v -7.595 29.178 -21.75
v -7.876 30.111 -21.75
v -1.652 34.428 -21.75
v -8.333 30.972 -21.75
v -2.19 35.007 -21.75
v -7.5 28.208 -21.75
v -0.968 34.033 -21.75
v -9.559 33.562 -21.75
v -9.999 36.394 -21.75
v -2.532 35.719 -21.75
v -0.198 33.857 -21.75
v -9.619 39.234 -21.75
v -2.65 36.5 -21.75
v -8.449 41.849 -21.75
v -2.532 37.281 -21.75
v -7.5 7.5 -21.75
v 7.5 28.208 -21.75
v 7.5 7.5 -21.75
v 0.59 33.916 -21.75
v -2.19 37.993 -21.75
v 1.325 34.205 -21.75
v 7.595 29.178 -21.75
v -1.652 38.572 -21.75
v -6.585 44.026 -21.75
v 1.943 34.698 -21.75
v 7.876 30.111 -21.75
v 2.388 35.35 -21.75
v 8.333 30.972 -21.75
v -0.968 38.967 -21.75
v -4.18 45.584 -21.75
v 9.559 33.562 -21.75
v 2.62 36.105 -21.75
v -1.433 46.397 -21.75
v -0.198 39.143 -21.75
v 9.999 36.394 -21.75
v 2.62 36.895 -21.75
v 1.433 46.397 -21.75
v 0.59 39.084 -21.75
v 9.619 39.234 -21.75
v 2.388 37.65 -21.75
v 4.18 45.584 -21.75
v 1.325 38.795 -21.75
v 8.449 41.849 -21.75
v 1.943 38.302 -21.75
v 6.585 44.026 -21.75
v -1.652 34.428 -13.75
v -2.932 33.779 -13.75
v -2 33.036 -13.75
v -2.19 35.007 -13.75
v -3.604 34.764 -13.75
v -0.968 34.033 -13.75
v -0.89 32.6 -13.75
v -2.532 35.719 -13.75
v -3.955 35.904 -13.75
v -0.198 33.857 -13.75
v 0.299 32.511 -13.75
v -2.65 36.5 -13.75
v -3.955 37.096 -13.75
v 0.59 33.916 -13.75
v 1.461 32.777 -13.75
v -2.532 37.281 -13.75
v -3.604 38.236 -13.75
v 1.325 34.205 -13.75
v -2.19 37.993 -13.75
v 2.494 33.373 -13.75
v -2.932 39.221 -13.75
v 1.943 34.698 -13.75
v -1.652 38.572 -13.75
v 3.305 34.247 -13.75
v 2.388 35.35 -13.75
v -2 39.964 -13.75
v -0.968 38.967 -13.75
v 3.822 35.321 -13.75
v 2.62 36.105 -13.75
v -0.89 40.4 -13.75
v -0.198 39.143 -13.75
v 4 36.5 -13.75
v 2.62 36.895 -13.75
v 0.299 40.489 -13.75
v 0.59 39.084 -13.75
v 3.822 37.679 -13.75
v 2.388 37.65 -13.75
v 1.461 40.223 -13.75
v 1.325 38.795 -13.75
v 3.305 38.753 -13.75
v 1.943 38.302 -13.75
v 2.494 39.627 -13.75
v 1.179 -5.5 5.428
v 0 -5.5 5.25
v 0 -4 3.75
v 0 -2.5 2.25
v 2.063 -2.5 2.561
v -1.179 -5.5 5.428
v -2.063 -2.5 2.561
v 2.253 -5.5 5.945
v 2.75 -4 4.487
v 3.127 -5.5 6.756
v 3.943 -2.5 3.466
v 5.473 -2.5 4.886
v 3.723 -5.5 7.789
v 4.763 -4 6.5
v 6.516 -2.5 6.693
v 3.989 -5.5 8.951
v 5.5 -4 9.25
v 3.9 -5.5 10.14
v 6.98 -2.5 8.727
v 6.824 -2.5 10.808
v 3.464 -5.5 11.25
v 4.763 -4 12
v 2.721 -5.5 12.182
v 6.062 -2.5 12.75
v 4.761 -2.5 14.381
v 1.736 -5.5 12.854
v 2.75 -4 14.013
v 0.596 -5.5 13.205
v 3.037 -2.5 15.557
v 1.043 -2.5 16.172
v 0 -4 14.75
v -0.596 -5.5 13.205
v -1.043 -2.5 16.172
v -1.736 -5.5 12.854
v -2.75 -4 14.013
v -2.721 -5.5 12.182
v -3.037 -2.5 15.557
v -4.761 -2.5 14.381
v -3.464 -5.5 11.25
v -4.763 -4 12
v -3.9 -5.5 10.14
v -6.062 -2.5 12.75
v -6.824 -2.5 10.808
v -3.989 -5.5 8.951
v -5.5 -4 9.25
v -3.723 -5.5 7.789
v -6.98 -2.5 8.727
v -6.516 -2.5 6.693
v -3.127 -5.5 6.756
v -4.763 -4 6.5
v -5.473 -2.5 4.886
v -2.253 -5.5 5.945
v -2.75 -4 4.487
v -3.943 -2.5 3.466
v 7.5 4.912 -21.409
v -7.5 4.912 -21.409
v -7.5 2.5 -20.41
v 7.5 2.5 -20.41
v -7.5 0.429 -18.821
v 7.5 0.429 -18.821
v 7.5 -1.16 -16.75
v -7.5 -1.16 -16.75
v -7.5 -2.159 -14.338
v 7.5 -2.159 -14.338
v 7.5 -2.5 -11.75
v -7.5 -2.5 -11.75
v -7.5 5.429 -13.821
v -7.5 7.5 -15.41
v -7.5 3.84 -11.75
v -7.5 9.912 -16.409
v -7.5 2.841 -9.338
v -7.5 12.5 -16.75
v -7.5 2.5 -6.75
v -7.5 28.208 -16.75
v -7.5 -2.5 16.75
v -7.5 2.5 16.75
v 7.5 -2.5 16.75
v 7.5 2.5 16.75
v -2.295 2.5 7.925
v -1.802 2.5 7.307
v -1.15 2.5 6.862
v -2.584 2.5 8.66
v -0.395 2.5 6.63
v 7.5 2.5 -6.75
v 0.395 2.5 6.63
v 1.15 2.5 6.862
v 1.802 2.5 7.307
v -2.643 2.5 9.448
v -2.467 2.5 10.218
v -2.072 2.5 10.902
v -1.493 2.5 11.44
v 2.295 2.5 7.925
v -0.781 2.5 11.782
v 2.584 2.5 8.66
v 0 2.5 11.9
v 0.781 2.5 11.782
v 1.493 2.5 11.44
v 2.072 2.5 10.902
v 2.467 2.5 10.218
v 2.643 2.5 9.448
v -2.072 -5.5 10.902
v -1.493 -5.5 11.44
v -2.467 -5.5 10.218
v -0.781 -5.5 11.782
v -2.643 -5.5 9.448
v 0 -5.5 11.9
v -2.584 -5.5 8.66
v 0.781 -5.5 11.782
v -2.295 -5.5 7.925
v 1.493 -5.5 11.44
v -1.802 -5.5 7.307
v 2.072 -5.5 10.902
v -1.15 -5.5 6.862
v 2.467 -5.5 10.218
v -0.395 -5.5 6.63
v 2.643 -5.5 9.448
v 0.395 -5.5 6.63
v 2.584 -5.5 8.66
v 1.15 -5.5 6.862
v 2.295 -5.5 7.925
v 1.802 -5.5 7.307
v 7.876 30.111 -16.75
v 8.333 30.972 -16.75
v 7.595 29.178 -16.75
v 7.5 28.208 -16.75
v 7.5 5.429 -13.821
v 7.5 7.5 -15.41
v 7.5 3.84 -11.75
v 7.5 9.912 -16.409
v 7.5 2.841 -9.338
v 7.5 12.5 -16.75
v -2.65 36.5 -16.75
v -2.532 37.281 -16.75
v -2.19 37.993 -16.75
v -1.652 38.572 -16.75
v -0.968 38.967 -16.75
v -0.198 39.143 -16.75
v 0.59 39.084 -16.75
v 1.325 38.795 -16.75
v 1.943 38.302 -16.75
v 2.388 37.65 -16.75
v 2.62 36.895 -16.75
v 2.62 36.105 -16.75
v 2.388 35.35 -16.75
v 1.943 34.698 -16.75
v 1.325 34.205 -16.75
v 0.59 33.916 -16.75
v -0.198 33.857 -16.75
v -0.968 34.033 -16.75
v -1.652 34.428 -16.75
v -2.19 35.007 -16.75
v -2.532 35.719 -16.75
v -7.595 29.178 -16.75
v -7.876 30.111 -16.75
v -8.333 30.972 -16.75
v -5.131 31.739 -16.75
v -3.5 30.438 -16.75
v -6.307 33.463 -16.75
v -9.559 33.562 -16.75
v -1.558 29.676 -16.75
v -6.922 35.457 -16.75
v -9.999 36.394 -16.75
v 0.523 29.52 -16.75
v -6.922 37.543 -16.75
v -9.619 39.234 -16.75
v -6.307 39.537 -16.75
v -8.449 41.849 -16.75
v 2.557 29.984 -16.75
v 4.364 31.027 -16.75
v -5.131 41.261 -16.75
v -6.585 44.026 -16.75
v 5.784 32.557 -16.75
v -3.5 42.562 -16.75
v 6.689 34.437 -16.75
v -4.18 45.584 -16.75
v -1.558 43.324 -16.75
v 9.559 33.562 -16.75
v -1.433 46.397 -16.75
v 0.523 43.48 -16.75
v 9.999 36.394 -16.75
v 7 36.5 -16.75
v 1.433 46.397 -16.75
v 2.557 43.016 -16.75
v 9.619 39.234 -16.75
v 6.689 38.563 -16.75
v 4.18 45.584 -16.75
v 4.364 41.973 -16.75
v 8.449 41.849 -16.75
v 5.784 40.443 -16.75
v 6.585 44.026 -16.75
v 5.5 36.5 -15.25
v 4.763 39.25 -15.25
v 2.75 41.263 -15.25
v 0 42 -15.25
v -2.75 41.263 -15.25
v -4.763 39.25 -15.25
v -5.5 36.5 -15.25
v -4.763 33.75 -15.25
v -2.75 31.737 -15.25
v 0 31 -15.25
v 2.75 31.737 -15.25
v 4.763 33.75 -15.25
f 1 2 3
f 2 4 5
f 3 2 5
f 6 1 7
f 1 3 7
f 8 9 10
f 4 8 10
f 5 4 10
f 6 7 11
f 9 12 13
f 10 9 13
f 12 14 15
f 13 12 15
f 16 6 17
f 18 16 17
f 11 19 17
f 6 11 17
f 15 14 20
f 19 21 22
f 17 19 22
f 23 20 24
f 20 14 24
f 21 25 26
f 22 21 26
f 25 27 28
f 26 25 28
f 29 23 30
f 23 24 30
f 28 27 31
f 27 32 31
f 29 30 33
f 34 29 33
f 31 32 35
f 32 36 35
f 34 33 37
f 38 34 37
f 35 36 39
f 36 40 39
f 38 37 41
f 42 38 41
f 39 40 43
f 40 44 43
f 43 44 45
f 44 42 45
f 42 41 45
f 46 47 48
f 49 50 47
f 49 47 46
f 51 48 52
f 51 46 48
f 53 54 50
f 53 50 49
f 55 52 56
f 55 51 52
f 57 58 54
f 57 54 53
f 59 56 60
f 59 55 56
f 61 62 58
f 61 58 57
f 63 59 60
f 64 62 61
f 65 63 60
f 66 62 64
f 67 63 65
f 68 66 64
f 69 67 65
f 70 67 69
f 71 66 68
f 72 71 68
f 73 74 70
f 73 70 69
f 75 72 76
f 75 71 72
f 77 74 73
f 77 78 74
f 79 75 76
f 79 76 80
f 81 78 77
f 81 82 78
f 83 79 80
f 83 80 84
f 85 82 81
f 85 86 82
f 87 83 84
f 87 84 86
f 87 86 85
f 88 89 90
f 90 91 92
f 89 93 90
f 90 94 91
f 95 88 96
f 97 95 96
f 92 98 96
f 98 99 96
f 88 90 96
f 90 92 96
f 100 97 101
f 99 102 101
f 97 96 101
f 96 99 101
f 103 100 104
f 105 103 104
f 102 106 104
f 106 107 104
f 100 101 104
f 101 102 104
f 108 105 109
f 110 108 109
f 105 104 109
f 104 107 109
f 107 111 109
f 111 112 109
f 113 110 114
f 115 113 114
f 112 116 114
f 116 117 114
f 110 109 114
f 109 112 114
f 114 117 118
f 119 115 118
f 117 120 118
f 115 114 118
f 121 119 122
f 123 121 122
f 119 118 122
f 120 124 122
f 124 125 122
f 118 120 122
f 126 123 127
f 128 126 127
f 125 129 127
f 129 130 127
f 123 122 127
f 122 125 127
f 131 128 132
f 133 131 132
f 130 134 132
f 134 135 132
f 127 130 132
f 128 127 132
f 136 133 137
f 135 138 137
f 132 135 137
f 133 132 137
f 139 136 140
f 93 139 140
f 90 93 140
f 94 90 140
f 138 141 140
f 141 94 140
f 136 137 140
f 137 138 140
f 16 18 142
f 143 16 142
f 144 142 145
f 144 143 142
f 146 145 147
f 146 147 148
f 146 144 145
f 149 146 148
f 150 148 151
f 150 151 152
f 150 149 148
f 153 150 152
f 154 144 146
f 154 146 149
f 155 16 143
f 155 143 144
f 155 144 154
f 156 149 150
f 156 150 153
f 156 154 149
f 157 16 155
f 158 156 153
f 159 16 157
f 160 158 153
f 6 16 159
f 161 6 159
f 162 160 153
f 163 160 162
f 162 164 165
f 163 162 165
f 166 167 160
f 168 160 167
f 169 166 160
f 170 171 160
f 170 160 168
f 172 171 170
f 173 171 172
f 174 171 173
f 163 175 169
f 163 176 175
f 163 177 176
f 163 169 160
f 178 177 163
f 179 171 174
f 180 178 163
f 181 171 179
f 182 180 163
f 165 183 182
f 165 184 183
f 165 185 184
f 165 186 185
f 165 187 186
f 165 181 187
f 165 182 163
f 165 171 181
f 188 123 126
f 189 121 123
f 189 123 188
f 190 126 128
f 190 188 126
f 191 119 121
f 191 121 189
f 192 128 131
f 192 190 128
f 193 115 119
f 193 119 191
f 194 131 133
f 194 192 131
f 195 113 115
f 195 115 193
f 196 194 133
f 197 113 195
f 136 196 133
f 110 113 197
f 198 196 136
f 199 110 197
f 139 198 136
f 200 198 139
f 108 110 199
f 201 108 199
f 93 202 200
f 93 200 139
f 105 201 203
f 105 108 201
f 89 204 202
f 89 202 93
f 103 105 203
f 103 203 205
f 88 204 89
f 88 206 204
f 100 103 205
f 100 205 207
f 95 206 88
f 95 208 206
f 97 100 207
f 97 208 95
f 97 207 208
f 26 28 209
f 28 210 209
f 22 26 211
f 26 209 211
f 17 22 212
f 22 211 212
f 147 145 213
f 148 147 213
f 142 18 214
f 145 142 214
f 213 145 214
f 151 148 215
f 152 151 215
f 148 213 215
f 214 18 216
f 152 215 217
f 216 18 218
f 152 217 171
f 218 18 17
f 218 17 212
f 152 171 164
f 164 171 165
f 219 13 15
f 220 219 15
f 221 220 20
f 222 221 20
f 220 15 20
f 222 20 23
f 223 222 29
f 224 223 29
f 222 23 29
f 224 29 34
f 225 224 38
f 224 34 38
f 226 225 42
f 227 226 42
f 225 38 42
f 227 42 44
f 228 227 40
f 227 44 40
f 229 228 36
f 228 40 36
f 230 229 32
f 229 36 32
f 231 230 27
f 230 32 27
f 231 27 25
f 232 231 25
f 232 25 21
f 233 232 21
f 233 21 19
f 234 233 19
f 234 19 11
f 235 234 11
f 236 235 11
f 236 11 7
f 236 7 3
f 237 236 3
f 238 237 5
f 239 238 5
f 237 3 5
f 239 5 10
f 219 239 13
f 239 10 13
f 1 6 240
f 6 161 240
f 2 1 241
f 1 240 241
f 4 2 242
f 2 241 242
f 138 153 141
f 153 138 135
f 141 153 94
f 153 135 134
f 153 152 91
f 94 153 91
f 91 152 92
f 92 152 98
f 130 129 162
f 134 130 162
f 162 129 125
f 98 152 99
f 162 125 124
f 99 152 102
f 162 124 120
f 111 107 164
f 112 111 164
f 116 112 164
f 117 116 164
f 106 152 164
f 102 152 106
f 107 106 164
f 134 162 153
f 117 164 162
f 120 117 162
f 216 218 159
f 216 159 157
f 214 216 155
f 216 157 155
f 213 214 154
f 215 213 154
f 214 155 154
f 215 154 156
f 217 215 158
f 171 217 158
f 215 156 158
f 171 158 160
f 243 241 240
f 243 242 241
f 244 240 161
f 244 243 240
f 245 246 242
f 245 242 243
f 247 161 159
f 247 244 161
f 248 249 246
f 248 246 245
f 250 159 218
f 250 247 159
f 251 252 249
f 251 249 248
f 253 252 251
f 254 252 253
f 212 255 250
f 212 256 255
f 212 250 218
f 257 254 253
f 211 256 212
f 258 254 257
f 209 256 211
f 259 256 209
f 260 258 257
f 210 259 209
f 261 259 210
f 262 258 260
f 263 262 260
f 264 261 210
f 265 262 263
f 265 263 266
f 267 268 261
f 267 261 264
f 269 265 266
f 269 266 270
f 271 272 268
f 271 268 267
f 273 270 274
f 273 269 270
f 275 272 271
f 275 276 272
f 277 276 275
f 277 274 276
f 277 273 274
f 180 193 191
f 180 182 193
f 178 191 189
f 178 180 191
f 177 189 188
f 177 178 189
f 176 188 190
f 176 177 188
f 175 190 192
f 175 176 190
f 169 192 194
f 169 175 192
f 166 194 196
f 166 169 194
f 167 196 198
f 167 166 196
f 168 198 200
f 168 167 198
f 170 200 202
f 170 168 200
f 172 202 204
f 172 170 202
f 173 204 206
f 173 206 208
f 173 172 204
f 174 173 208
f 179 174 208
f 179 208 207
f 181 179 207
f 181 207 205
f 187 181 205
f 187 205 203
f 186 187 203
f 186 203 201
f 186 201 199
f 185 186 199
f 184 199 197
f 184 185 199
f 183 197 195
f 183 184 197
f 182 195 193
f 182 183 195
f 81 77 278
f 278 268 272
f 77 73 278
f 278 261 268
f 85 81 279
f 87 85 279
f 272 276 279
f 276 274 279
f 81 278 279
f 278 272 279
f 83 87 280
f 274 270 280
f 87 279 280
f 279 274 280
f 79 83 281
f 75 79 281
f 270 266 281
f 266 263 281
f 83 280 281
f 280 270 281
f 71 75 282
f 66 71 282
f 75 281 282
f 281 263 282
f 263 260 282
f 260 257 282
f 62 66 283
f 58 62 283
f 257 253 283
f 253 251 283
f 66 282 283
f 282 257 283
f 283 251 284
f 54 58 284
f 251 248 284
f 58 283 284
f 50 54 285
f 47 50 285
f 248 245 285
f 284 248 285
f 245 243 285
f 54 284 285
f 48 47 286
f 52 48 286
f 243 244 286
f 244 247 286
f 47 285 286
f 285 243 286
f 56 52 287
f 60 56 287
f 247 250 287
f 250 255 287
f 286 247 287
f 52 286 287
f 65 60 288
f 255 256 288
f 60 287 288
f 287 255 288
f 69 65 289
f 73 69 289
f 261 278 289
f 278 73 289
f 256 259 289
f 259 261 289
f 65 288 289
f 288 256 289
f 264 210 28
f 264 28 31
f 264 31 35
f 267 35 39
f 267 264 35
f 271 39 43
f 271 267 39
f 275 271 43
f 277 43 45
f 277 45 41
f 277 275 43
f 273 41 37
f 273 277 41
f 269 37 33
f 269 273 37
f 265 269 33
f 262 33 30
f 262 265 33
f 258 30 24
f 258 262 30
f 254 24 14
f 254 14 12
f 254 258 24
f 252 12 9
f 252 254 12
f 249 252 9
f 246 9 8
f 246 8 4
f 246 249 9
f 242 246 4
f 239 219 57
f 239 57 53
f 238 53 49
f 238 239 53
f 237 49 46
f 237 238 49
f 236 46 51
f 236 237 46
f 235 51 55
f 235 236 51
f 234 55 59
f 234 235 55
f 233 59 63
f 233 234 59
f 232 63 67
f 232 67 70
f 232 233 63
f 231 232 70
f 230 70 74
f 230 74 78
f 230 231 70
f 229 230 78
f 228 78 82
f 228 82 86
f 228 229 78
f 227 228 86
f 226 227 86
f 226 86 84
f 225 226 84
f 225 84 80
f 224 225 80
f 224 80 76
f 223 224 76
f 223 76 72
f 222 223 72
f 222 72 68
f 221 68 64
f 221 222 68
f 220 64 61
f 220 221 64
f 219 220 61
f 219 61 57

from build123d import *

# Parameters (mm, degrees)
BOSS_EXTRUDE5_DEPTH      = 7.5
BOSS_EXTRUDE5_DEPTH_BACK = 7.5
SKETCH8_W                = 33.5
SKETCH8_H                = 5
SKETCH9_R                = 10
BOSS_EXTRUDE6_DEPTH      = 5
SKETCH11_R               = 2.65
CUT_EXTRUDE7_DEPTH       = 5
SKETCH12_R               = 4
SKETCH12_R_2             = 2.65
BOSS_EXTRUDE7_DEPTH      = 3
CHAMFER1_SIZE            = 3
FILLET1_R                = 10
FILLET2_R                = 5
SKETCH13_R               = 2.65
CUT_EXTRUDE8_DEPTH       = 50
SKETCH14_R               = 4
SKETCH14_R_2             = 2.65
BOSS_EXTRUDE8_DEPTH      = 3
CHAMFER2_SIZE            = 3


with BuildPart() as part:
    # Sketch8 → Boss-Extrude5 (new, two sides: drawn at the far end of the back side and taken through both)
    with BuildSketch(Plane.ZY.offset(-BOSS_EXTRUDE5_DEPTH_BACK)):
        Rectangle(SKETCH8_W, SKETCH8_H)
        Polygon((-16.75, -2.5), (-16.75, 2.5), (-16.75, 41.5), (-21.75, 41.5), (-21.75, -2.5), align=None)
    extrude(amount=BOSS_EXTRUDE5_DEPTH + BOSS_EXTRUDE5_DEPTH_BACK)

    # Sketch9 → Boss-Extrude6 (add)
    with BuildSketch(Plane.XY.offset(-16.75)):
        with Locations((0, 36.5)):
            Circle(SKETCH9_R)
    extrude(amount=-BOSS_EXTRUDE6_DEPTH)

    # Sketch11 → Cut-Extrude7 (cut)
    with BuildSketch(Plane(origin=(0, 0, -21.75), x_dir=(-1, 0, 0), z_dir=(0, 0, -1))):
        with Locations((0, 36.5)):
            Circle(SKETCH11_R)
    extrude(amount=-CUT_EXTRUDE7_DEPTH, mode=Mode.SUBTRACT)

    # Sketch12 → Boss-Extrude7 (add)
    with BuildSketch(Plane.XY.offset(-16.75)):
        with Locations((0, 36.5)):
            Circle(SKETCH12_R)
        with Locations(Location((0, 36.5, 0), (0, 0, 180))):
            Circle(SKETCH12_R_2, mode=Mode.SUBTRACT)
    extrude(amount=BOSS_EXTRUDE7_DEPTH)

    # Chamfer1
    chamfer1_edges = [part.edges().sort_by_distance(p)[0] for p in [
        (-4, 36.5, -16.75),
    ]]
    chamfer(chamfer1_edges, length=CHAMFER1_SIZE - 0.0001)  # a hair under: the kernel refuses the full size

    # Fillet1
    fillet1_edges = [part.edges().sort_by_distance(p)[0] for p in [
        (0, -2.5, -21.75),
        (0, 2.5, -16.75),
    ]]
    fillet(fillet1_edges, radius=FILLET1_R)

    # Fillet2
    fillet2_edges = [part.edges().sort_by_distance(p)[0] for p in [
        (-7.5, 29.885621722, -19.25),
        (7.5, 29.885621722, -19.25),
    ]]
    fillet(fillet2_edges, radius=FILLET2_R)

    # Sketch13 → Cut-Extrude8 (cut)
    with BuildSketch(Plane(origin=(0, 2.5, 0), x_dir=(1, 0, 0), z_dir=(0, 1, 0))):
        with Locations(Location((0, -9.25, 0), (0, 0, 270))):
            Circle(SKETCH13_R)
    extrude(amount=-CUT_EXTRUDE8_DEPTH, mode=Mode.SUBTRACT)

    # Sketch14 → Boss-Extrude8 (add)
    with BuildSketch(Plane.XZ.offset(2.5)):
        with Locations(Location((0, 9.25, 0), (0, 0, 270))):
            Circle(SKETCH14_R)
        with Locations(Location((0, 9.25, 0), (0, 0, 90))):
            Circle(SKETCH14_R_2, mode=Mode.SUBTRACT)
    extrude(amount=BOSS_EXTRUDE8_DEPTH)

    # Chamfer2
    chamfer2_edges = [part.edges().sort_by_distance(p)[0] for p in [
        (0, -2.5, 13.25),
    ]]
    chamfer(chamfer2_edges, length=CHAMFER2_SIZE - 0.0001)  # a hair under: the kernel refuses the full size


solid = part.part
